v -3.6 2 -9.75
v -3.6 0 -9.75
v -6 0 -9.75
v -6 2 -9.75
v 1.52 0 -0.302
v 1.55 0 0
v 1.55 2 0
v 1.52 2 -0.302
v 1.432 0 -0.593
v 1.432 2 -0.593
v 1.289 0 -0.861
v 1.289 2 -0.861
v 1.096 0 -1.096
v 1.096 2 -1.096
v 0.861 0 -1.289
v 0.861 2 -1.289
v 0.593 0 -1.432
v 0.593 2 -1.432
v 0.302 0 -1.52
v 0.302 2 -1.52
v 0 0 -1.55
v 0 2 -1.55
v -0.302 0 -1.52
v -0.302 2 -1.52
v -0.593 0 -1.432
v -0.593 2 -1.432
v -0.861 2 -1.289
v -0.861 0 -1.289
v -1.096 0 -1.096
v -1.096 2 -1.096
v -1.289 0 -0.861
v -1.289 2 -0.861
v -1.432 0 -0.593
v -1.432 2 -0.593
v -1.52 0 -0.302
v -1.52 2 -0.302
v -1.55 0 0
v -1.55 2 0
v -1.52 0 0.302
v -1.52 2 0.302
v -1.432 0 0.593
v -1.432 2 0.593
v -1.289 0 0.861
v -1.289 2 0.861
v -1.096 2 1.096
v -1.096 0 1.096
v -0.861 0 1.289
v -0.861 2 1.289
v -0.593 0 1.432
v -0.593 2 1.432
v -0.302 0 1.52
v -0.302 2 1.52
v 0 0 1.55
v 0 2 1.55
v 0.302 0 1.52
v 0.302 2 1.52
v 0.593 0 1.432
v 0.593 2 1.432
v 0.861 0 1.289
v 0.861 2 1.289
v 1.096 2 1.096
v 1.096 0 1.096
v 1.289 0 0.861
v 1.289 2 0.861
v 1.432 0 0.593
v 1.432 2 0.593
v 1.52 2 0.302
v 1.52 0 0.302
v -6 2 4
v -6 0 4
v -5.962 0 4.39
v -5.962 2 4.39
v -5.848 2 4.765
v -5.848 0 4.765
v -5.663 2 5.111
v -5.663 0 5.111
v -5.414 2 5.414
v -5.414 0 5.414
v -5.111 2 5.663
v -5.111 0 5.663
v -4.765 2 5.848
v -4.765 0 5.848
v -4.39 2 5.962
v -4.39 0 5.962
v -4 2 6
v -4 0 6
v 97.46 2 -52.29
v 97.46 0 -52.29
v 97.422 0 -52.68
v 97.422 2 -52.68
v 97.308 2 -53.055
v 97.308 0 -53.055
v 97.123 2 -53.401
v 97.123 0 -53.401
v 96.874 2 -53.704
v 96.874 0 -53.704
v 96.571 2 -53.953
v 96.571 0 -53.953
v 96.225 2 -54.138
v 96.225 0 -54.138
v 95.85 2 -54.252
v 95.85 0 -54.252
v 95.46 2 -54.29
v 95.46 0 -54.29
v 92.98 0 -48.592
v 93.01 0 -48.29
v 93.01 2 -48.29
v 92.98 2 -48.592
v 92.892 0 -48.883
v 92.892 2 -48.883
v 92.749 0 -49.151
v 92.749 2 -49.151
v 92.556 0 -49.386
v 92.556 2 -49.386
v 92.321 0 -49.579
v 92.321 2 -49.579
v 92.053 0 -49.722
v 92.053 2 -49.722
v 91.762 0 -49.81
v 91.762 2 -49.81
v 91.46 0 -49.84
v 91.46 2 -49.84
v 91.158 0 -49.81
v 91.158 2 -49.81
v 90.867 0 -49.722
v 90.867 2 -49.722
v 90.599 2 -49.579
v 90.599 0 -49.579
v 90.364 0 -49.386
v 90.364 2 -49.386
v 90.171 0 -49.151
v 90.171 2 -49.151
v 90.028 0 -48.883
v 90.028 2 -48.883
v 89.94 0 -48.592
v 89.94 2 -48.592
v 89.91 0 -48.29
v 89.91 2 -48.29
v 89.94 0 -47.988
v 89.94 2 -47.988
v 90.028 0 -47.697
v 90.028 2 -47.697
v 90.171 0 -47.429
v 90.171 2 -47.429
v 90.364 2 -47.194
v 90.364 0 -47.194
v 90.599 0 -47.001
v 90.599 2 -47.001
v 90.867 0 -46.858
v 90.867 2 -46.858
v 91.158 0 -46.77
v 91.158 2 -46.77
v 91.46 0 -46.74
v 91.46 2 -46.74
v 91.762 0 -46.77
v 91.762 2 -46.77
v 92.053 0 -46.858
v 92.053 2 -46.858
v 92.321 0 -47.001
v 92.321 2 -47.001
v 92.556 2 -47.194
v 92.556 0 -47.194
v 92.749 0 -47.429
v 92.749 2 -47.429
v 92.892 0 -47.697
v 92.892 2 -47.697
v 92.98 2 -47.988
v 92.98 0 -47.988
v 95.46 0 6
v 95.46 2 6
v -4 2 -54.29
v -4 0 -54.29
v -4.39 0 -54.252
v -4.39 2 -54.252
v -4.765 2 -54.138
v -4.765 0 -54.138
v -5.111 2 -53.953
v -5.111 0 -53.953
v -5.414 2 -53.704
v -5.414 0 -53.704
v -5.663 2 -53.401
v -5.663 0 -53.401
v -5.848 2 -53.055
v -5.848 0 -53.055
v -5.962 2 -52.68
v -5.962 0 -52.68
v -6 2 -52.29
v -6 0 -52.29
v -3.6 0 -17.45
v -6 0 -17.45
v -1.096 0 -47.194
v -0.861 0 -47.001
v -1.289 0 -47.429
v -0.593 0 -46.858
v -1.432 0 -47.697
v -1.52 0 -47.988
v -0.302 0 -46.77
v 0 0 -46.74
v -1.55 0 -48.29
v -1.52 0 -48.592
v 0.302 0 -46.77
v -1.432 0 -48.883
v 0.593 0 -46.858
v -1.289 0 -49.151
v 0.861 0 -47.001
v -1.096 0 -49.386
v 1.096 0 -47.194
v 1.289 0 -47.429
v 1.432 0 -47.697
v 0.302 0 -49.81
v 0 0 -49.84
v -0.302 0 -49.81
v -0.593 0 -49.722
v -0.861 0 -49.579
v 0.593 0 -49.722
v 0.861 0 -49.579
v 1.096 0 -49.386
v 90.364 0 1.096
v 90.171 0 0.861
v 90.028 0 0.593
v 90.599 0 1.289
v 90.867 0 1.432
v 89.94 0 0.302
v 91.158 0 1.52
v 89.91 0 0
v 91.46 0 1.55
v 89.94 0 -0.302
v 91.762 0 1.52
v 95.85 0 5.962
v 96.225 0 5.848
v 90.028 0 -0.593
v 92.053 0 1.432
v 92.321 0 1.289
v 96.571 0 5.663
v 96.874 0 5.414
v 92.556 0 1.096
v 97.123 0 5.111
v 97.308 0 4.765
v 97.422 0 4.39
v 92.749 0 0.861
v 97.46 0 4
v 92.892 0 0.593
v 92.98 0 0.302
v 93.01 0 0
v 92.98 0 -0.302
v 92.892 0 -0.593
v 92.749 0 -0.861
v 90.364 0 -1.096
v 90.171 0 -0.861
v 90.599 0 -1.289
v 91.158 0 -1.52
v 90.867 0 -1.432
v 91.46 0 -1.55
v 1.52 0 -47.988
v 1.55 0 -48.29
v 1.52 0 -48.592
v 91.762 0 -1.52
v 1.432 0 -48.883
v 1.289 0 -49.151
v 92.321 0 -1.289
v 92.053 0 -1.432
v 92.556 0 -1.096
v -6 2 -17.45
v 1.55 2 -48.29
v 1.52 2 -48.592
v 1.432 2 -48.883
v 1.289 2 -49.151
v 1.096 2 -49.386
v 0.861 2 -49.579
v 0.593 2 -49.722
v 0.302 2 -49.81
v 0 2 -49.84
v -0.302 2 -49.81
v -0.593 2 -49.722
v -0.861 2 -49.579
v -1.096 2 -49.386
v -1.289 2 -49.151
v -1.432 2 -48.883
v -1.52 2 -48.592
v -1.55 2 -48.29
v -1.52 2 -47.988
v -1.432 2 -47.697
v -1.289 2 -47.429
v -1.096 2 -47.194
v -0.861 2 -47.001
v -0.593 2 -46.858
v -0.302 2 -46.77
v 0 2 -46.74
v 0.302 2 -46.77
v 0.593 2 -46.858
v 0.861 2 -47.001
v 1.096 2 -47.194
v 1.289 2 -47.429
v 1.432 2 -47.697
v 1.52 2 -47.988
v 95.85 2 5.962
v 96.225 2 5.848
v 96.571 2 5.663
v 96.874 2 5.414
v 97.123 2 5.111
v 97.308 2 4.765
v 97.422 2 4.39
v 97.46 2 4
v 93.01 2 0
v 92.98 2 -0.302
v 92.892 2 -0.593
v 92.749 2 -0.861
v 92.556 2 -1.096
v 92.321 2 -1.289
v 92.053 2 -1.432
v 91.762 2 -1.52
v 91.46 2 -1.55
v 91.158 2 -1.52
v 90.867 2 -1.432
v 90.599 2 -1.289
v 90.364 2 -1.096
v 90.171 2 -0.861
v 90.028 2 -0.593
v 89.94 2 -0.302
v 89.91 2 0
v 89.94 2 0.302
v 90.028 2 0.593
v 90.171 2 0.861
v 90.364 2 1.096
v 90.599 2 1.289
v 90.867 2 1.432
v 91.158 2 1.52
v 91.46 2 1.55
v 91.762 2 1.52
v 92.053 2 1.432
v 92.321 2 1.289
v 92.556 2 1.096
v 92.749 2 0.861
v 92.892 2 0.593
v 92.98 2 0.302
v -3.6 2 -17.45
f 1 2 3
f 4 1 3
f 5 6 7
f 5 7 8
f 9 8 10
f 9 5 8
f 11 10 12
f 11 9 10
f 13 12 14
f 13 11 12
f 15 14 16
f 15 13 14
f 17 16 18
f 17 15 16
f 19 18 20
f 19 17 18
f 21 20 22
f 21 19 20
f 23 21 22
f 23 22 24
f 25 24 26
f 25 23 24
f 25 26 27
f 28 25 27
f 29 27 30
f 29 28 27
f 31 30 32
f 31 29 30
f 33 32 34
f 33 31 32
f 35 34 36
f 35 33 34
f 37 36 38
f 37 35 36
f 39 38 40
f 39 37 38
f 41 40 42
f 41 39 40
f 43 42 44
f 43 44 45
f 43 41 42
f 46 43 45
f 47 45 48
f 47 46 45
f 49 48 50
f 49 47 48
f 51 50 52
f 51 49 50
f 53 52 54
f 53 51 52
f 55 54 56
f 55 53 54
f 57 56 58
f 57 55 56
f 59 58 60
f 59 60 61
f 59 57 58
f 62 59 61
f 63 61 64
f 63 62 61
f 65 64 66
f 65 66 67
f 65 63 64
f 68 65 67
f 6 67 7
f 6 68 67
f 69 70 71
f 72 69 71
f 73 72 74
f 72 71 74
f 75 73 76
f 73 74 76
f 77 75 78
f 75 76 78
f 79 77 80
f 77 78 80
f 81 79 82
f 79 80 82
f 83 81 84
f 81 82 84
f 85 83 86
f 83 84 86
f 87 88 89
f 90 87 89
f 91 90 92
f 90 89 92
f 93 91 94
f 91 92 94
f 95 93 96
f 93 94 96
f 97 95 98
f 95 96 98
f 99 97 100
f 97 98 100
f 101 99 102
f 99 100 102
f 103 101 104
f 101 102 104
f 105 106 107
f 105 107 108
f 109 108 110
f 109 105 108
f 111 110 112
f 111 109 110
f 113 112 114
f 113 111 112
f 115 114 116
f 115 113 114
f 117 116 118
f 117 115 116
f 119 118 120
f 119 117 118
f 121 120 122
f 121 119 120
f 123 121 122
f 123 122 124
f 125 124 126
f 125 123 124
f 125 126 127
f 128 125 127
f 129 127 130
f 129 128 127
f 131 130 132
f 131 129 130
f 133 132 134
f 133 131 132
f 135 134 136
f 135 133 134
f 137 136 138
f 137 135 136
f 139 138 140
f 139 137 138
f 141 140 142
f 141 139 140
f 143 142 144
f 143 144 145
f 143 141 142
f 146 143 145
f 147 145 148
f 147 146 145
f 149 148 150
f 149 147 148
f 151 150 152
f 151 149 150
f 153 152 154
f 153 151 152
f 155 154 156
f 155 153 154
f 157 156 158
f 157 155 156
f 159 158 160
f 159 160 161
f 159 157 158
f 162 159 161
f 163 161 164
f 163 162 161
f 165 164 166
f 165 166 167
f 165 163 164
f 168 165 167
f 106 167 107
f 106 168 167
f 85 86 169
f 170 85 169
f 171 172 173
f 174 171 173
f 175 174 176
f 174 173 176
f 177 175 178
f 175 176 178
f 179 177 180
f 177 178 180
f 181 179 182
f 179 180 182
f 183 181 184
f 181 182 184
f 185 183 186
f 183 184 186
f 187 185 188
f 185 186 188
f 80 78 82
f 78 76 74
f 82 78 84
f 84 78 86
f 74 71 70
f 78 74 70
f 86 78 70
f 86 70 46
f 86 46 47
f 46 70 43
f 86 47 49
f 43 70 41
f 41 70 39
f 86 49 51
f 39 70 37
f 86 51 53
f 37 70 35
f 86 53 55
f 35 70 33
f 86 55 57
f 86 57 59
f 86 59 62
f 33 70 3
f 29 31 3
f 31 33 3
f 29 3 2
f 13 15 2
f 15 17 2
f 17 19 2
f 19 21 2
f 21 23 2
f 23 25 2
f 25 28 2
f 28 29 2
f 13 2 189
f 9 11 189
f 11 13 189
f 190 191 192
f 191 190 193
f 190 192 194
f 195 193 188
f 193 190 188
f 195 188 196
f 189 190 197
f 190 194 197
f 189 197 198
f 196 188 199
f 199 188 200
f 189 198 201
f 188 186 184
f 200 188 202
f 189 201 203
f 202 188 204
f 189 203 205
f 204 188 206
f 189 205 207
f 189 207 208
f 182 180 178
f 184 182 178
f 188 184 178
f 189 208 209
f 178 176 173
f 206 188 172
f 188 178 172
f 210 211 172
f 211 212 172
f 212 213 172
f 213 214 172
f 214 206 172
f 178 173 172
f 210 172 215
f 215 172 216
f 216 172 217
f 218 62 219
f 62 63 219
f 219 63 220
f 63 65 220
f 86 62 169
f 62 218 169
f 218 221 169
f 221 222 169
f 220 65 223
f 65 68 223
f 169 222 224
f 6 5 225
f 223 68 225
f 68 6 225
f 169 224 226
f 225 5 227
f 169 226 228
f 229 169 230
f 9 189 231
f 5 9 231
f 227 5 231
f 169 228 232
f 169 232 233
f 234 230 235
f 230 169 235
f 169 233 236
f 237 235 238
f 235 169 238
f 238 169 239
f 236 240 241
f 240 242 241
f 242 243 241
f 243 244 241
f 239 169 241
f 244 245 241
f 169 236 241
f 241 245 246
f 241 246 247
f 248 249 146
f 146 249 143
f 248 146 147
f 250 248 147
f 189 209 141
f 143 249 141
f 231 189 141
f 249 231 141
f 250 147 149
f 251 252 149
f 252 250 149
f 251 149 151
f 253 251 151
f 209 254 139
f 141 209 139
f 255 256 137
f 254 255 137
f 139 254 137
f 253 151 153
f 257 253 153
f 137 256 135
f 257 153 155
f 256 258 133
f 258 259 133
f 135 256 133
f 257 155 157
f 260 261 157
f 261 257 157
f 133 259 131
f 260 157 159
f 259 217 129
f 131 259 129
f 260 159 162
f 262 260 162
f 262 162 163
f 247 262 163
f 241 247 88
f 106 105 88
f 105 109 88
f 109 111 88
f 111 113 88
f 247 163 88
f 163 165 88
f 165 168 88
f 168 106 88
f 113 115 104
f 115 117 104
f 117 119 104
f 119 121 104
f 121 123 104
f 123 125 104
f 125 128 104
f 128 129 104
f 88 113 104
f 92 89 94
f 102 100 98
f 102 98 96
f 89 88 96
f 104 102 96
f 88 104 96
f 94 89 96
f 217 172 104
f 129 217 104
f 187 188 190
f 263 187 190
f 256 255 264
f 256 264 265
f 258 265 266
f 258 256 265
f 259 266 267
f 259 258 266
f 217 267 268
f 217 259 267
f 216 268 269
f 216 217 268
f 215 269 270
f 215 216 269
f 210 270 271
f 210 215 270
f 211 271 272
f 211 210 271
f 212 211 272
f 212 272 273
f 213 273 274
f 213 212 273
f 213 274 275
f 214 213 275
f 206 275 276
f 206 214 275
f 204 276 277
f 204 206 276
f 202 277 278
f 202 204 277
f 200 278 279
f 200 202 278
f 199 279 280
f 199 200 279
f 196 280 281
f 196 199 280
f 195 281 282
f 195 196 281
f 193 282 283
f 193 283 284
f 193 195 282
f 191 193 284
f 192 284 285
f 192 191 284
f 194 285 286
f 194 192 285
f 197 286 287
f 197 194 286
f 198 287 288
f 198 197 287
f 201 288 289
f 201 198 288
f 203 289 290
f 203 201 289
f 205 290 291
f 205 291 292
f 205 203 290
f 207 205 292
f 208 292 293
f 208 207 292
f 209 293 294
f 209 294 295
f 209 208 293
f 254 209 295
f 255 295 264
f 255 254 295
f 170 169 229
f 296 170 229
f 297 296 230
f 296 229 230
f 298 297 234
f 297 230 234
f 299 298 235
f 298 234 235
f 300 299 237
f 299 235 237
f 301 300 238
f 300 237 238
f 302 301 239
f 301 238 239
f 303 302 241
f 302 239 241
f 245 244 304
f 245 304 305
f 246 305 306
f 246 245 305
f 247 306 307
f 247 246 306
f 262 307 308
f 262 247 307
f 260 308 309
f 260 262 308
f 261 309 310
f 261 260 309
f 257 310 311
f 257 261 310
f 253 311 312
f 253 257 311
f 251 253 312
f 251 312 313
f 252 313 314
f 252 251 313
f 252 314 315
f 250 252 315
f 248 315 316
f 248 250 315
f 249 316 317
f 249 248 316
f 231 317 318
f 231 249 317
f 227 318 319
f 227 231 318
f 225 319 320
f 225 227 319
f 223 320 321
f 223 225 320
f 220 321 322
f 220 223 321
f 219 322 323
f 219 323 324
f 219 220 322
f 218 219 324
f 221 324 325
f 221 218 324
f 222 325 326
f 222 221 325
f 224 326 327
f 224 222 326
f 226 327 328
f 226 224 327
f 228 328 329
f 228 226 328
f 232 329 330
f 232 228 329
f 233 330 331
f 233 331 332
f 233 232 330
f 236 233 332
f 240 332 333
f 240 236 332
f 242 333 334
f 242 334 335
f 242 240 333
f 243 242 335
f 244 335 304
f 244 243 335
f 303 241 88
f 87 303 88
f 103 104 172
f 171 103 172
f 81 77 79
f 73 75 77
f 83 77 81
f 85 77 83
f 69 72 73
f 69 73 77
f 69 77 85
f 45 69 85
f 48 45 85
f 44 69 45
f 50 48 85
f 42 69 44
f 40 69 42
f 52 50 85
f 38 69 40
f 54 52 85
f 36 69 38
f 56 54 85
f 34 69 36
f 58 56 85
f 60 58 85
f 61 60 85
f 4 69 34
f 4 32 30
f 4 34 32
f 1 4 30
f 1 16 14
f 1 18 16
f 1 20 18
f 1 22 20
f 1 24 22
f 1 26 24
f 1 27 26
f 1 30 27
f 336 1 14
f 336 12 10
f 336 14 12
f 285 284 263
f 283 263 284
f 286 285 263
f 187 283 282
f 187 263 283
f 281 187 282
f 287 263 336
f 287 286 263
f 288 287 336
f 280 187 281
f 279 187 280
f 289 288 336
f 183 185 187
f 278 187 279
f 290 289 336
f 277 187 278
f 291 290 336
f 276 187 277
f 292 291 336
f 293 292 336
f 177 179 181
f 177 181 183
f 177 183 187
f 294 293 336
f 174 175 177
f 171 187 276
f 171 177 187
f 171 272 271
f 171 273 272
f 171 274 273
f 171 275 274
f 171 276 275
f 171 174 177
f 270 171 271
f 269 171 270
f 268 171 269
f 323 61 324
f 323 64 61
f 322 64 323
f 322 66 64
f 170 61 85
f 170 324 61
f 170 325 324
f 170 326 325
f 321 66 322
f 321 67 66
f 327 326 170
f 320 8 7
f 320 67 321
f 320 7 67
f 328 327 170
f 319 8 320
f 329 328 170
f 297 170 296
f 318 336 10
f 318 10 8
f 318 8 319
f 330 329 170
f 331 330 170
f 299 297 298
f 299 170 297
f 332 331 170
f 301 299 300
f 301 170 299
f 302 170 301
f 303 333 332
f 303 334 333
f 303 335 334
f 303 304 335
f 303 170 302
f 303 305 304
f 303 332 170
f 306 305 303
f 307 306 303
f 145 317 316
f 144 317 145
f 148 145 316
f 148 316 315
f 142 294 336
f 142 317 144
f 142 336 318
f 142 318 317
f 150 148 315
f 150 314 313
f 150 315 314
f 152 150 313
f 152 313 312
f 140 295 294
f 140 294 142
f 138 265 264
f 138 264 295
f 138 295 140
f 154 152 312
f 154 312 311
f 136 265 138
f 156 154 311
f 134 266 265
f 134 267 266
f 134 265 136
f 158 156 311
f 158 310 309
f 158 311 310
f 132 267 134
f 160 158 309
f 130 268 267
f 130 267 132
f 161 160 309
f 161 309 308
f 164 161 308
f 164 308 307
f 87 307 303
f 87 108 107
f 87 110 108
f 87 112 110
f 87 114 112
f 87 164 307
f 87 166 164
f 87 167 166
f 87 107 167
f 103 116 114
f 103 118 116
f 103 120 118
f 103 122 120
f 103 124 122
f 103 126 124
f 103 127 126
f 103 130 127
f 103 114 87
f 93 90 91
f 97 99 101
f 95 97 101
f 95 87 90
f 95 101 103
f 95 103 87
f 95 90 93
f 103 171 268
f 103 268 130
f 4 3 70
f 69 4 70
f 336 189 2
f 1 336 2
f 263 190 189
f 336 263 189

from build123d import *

# Parameters (mm, degrees)
SKETCH_1_R      = 1.55
EXTRUDE_1_DEPTH = 2


with BuildPart() as part:
    # 草图1 → 凸台-拉伸1 (new body)
    with BuildSketch(Plane(origin=(0, 0, 0), x_dir=(1, 0, 0), z_dir=(0, 1, 0))):
        with BuildLine():
            Line((97.46, -4), (97.46, 52.29))
            ThreePointArc((97.46, 52.29), (96.874213562, 53.704213562), (95.46, 54.29))
            Line((95.46, 54.29), (-4, 54.29))
            ThreePointArc((-4, 54.29), (-5.414213562, 53.704213562), (-6, 52.29))
            Line((-6, 52.29), (-6, 17.45))
            Line((-6, 17.45), (-3.6, 17.45))
            Line((-3.6, 17.45), (-3.6, 9.75))
            Line((-3.6, 9.75), (-6, 9.75))
            Line((-6, 9.75), (-6, -4))
            ThreePointArc((-6, -4), (-5.414213562, -5.414213562), (-4, -6))
            Line((-4, -6), (95.46, -6))
            ThreePointArc((95.46, -6), (96.874213562, -5.414213562), (97.46, -4))
        make_face()
        Circle(SKETCH_1_R, mode=Mode.SUBTRACT)
        with Locations((91.46, 0)):
            Circle(SKETCH_1_R, mode=Mode.SUBTRACT)
        with Locations((0, 48.29)):
            Circle(SKETCH_1_R, mode=Mode.SUBTRACT)
        with Locations((91.46, 48.29)):
            Circle(SKETCH_1_R, mode=Mode.SUBTRACT)
    extrude(amount=EXTRUDE_1_DEPTH)


solid = part.part
